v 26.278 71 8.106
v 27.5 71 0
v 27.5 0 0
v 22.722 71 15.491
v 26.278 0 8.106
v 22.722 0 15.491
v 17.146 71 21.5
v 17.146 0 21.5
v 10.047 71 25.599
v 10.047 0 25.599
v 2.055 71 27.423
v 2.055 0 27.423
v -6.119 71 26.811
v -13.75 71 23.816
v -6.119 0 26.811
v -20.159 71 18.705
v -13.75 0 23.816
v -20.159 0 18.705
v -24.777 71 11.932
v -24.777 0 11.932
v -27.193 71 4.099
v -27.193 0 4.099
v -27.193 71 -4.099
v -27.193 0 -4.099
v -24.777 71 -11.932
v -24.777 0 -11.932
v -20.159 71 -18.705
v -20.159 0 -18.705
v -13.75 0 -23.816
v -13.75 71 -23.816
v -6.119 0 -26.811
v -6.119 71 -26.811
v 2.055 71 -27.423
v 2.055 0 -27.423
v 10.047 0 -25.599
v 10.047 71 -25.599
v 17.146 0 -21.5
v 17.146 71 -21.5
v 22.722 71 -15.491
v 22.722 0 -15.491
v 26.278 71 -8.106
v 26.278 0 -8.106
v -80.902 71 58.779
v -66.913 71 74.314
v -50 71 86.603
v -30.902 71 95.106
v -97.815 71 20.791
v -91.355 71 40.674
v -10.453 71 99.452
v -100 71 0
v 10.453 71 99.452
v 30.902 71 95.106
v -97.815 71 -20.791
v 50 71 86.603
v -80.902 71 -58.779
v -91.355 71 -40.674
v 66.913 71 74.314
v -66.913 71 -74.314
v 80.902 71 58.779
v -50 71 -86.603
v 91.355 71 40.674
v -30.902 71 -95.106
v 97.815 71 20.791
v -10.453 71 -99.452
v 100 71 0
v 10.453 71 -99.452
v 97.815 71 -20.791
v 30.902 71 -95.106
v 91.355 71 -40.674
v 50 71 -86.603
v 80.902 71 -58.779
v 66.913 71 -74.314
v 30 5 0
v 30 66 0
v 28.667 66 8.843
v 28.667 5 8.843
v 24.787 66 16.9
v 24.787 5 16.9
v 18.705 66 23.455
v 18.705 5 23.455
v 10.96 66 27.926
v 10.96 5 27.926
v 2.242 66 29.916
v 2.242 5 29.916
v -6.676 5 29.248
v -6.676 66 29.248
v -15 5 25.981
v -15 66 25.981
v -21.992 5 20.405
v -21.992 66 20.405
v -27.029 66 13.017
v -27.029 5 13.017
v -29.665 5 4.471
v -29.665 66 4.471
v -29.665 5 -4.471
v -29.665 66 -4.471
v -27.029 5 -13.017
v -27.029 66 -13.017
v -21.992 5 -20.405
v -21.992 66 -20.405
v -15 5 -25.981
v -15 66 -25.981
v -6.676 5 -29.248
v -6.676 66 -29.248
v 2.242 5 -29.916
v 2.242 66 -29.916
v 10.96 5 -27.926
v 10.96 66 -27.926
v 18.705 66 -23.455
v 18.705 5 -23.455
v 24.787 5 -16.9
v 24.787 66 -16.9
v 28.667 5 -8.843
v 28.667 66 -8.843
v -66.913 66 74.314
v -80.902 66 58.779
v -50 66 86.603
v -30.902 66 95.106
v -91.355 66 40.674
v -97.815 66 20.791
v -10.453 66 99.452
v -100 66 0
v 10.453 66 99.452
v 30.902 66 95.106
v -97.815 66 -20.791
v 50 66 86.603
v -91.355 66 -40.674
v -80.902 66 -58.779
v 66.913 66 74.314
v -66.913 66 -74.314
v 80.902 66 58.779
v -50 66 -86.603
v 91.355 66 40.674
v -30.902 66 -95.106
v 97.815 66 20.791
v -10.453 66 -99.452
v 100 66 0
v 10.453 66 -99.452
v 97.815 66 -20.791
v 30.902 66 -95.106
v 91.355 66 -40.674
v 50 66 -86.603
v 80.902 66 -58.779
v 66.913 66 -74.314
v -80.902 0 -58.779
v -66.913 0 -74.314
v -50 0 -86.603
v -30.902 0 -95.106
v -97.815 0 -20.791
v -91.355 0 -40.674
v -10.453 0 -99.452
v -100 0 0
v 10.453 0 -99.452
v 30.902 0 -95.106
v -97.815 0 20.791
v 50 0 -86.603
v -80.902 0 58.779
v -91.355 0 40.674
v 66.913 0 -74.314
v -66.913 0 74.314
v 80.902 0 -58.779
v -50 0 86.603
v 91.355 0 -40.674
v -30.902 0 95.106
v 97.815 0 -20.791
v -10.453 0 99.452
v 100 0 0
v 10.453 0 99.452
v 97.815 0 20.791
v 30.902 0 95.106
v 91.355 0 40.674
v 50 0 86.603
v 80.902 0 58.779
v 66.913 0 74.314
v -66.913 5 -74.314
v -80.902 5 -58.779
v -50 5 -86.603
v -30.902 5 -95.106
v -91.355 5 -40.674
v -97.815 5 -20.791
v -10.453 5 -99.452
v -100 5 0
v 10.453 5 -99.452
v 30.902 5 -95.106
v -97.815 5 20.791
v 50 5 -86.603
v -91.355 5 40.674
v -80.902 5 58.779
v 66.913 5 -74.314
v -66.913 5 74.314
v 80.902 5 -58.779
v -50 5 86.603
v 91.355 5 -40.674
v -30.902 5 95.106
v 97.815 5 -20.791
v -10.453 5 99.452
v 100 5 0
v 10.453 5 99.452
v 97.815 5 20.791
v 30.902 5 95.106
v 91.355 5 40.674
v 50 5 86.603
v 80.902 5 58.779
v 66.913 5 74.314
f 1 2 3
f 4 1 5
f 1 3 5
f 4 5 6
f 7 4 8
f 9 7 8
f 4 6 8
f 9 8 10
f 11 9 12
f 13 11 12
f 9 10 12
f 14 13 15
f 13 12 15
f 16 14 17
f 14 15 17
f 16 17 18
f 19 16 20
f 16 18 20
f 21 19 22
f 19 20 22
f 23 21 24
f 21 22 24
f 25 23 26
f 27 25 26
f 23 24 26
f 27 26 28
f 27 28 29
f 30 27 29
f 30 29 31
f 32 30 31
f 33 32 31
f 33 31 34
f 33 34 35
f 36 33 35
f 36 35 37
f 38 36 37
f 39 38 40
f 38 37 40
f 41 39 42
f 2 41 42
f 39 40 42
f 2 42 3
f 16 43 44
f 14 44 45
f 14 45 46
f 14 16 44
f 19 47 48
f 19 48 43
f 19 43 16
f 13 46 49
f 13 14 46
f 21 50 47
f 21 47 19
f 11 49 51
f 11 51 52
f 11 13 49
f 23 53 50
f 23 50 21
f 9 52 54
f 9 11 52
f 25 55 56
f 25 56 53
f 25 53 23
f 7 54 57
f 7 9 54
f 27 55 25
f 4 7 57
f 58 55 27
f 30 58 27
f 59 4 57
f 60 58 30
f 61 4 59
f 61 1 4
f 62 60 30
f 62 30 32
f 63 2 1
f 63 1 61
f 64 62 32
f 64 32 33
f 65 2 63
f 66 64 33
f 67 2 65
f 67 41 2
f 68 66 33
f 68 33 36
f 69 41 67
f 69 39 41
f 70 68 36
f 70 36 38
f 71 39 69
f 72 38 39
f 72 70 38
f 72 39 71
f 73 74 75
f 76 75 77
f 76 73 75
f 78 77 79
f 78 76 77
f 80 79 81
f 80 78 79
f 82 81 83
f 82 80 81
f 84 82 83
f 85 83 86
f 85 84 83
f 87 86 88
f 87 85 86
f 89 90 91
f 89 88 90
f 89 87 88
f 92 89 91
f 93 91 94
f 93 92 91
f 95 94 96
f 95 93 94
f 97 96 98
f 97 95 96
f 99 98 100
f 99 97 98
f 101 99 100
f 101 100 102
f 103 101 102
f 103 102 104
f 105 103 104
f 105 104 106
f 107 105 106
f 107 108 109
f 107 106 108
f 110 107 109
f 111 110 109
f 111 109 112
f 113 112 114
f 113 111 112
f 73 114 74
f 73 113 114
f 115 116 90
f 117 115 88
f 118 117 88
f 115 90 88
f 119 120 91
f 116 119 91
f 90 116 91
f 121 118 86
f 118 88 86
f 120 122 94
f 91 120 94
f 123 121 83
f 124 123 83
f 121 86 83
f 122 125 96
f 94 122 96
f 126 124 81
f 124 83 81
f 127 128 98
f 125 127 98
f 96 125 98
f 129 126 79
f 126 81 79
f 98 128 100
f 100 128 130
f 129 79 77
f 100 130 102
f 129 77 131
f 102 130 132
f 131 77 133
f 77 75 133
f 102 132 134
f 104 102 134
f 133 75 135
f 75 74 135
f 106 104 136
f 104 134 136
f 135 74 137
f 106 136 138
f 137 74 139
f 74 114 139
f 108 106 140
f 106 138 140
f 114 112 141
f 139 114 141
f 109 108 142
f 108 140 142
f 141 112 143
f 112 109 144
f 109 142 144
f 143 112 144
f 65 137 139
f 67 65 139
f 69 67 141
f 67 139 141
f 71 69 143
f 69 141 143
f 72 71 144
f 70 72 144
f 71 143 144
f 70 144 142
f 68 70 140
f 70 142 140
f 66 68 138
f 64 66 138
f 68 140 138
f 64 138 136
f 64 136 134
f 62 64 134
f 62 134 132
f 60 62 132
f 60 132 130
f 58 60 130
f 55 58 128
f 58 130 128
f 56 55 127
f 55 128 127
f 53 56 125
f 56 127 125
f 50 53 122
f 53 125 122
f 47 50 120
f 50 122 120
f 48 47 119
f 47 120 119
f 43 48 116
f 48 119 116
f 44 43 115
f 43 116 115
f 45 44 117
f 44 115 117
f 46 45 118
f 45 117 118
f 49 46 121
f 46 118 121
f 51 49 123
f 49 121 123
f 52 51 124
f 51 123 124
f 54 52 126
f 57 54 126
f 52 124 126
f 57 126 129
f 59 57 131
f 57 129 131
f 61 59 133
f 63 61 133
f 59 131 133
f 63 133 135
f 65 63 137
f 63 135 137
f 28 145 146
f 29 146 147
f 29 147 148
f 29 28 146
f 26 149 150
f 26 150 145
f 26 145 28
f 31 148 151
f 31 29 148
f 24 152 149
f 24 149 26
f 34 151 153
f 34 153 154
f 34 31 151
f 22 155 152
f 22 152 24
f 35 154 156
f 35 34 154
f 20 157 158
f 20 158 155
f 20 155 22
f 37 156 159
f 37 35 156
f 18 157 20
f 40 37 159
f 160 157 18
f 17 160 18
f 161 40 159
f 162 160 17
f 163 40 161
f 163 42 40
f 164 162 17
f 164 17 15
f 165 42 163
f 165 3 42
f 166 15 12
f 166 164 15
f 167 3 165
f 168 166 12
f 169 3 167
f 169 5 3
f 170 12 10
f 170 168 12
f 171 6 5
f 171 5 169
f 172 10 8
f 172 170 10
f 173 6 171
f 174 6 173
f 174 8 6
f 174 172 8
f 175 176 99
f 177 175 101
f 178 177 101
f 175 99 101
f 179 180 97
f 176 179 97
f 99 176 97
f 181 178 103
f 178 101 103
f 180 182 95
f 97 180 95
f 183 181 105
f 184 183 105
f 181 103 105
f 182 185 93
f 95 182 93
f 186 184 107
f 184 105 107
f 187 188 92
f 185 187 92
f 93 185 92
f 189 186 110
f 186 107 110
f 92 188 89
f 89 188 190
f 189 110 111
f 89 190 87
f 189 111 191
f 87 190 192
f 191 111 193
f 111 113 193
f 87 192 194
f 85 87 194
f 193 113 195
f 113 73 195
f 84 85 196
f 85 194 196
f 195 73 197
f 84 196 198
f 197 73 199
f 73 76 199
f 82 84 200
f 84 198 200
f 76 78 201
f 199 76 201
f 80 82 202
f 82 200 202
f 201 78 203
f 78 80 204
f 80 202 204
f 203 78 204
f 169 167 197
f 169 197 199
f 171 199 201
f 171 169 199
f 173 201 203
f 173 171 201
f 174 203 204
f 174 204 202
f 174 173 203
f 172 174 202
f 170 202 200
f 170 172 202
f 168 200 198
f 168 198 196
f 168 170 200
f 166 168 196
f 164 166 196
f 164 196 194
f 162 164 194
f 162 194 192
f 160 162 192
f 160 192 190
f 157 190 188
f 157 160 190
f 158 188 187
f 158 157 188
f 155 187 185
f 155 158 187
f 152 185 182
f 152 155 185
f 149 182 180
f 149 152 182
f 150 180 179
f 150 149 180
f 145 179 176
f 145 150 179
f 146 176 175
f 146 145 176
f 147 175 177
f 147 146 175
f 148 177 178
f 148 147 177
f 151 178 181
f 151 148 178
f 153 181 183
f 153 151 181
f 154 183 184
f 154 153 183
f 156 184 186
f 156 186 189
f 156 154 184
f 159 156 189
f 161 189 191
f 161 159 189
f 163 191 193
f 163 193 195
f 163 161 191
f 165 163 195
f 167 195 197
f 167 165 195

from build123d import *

# Parameters (mm, degrees)
F0_R        = 100
F0_R_2      = 30
F1_DEPTH    = 5
F2_START    = 61
F1_FACE_R   = 100
F1_FACE_R_2 = 30
F2_DEPTH    = 5
F0_R_3      = 27.5
F3_DEPTH    = 71


with BuildPart() as f1:
    # F0 (on Front) → F1 (new body)
    with BuildSketch(Plane.XZ):
        Circle(F0_R)
        Circle(F0_R_2, mode=Mode.SUBTRACT)
    extrude(amount=-F1_DEPTH)



with BuildPart() as f2:
    # F1_face (on face) → F2 (new body)
    with BuildSketch(Plane(origin=(0, 5, 0), x_dir=(1, 0, 0), z_dir=(0, 1, 0)).offset(F2_START)):
        Circle(F1_FACE_R)
        Circle(F1_FACE_R_2, mode=Mode.SUBTRACT)
    extrude(amount=F2_DEPTH)


with BuildPart() as f1_1:
    add(f1.part)

    add(f2.part)  # F3 merges F2
    # F0 (on Front) → F3 (join)
    with BuildSketch(Plane.XZ):
        Circle(F0_R_2)
        Circle(F0_R_3, mode=Mode.SUBTRACT)
    extrude(amount=-F3_DEPTH)


solid = f1_1.part
